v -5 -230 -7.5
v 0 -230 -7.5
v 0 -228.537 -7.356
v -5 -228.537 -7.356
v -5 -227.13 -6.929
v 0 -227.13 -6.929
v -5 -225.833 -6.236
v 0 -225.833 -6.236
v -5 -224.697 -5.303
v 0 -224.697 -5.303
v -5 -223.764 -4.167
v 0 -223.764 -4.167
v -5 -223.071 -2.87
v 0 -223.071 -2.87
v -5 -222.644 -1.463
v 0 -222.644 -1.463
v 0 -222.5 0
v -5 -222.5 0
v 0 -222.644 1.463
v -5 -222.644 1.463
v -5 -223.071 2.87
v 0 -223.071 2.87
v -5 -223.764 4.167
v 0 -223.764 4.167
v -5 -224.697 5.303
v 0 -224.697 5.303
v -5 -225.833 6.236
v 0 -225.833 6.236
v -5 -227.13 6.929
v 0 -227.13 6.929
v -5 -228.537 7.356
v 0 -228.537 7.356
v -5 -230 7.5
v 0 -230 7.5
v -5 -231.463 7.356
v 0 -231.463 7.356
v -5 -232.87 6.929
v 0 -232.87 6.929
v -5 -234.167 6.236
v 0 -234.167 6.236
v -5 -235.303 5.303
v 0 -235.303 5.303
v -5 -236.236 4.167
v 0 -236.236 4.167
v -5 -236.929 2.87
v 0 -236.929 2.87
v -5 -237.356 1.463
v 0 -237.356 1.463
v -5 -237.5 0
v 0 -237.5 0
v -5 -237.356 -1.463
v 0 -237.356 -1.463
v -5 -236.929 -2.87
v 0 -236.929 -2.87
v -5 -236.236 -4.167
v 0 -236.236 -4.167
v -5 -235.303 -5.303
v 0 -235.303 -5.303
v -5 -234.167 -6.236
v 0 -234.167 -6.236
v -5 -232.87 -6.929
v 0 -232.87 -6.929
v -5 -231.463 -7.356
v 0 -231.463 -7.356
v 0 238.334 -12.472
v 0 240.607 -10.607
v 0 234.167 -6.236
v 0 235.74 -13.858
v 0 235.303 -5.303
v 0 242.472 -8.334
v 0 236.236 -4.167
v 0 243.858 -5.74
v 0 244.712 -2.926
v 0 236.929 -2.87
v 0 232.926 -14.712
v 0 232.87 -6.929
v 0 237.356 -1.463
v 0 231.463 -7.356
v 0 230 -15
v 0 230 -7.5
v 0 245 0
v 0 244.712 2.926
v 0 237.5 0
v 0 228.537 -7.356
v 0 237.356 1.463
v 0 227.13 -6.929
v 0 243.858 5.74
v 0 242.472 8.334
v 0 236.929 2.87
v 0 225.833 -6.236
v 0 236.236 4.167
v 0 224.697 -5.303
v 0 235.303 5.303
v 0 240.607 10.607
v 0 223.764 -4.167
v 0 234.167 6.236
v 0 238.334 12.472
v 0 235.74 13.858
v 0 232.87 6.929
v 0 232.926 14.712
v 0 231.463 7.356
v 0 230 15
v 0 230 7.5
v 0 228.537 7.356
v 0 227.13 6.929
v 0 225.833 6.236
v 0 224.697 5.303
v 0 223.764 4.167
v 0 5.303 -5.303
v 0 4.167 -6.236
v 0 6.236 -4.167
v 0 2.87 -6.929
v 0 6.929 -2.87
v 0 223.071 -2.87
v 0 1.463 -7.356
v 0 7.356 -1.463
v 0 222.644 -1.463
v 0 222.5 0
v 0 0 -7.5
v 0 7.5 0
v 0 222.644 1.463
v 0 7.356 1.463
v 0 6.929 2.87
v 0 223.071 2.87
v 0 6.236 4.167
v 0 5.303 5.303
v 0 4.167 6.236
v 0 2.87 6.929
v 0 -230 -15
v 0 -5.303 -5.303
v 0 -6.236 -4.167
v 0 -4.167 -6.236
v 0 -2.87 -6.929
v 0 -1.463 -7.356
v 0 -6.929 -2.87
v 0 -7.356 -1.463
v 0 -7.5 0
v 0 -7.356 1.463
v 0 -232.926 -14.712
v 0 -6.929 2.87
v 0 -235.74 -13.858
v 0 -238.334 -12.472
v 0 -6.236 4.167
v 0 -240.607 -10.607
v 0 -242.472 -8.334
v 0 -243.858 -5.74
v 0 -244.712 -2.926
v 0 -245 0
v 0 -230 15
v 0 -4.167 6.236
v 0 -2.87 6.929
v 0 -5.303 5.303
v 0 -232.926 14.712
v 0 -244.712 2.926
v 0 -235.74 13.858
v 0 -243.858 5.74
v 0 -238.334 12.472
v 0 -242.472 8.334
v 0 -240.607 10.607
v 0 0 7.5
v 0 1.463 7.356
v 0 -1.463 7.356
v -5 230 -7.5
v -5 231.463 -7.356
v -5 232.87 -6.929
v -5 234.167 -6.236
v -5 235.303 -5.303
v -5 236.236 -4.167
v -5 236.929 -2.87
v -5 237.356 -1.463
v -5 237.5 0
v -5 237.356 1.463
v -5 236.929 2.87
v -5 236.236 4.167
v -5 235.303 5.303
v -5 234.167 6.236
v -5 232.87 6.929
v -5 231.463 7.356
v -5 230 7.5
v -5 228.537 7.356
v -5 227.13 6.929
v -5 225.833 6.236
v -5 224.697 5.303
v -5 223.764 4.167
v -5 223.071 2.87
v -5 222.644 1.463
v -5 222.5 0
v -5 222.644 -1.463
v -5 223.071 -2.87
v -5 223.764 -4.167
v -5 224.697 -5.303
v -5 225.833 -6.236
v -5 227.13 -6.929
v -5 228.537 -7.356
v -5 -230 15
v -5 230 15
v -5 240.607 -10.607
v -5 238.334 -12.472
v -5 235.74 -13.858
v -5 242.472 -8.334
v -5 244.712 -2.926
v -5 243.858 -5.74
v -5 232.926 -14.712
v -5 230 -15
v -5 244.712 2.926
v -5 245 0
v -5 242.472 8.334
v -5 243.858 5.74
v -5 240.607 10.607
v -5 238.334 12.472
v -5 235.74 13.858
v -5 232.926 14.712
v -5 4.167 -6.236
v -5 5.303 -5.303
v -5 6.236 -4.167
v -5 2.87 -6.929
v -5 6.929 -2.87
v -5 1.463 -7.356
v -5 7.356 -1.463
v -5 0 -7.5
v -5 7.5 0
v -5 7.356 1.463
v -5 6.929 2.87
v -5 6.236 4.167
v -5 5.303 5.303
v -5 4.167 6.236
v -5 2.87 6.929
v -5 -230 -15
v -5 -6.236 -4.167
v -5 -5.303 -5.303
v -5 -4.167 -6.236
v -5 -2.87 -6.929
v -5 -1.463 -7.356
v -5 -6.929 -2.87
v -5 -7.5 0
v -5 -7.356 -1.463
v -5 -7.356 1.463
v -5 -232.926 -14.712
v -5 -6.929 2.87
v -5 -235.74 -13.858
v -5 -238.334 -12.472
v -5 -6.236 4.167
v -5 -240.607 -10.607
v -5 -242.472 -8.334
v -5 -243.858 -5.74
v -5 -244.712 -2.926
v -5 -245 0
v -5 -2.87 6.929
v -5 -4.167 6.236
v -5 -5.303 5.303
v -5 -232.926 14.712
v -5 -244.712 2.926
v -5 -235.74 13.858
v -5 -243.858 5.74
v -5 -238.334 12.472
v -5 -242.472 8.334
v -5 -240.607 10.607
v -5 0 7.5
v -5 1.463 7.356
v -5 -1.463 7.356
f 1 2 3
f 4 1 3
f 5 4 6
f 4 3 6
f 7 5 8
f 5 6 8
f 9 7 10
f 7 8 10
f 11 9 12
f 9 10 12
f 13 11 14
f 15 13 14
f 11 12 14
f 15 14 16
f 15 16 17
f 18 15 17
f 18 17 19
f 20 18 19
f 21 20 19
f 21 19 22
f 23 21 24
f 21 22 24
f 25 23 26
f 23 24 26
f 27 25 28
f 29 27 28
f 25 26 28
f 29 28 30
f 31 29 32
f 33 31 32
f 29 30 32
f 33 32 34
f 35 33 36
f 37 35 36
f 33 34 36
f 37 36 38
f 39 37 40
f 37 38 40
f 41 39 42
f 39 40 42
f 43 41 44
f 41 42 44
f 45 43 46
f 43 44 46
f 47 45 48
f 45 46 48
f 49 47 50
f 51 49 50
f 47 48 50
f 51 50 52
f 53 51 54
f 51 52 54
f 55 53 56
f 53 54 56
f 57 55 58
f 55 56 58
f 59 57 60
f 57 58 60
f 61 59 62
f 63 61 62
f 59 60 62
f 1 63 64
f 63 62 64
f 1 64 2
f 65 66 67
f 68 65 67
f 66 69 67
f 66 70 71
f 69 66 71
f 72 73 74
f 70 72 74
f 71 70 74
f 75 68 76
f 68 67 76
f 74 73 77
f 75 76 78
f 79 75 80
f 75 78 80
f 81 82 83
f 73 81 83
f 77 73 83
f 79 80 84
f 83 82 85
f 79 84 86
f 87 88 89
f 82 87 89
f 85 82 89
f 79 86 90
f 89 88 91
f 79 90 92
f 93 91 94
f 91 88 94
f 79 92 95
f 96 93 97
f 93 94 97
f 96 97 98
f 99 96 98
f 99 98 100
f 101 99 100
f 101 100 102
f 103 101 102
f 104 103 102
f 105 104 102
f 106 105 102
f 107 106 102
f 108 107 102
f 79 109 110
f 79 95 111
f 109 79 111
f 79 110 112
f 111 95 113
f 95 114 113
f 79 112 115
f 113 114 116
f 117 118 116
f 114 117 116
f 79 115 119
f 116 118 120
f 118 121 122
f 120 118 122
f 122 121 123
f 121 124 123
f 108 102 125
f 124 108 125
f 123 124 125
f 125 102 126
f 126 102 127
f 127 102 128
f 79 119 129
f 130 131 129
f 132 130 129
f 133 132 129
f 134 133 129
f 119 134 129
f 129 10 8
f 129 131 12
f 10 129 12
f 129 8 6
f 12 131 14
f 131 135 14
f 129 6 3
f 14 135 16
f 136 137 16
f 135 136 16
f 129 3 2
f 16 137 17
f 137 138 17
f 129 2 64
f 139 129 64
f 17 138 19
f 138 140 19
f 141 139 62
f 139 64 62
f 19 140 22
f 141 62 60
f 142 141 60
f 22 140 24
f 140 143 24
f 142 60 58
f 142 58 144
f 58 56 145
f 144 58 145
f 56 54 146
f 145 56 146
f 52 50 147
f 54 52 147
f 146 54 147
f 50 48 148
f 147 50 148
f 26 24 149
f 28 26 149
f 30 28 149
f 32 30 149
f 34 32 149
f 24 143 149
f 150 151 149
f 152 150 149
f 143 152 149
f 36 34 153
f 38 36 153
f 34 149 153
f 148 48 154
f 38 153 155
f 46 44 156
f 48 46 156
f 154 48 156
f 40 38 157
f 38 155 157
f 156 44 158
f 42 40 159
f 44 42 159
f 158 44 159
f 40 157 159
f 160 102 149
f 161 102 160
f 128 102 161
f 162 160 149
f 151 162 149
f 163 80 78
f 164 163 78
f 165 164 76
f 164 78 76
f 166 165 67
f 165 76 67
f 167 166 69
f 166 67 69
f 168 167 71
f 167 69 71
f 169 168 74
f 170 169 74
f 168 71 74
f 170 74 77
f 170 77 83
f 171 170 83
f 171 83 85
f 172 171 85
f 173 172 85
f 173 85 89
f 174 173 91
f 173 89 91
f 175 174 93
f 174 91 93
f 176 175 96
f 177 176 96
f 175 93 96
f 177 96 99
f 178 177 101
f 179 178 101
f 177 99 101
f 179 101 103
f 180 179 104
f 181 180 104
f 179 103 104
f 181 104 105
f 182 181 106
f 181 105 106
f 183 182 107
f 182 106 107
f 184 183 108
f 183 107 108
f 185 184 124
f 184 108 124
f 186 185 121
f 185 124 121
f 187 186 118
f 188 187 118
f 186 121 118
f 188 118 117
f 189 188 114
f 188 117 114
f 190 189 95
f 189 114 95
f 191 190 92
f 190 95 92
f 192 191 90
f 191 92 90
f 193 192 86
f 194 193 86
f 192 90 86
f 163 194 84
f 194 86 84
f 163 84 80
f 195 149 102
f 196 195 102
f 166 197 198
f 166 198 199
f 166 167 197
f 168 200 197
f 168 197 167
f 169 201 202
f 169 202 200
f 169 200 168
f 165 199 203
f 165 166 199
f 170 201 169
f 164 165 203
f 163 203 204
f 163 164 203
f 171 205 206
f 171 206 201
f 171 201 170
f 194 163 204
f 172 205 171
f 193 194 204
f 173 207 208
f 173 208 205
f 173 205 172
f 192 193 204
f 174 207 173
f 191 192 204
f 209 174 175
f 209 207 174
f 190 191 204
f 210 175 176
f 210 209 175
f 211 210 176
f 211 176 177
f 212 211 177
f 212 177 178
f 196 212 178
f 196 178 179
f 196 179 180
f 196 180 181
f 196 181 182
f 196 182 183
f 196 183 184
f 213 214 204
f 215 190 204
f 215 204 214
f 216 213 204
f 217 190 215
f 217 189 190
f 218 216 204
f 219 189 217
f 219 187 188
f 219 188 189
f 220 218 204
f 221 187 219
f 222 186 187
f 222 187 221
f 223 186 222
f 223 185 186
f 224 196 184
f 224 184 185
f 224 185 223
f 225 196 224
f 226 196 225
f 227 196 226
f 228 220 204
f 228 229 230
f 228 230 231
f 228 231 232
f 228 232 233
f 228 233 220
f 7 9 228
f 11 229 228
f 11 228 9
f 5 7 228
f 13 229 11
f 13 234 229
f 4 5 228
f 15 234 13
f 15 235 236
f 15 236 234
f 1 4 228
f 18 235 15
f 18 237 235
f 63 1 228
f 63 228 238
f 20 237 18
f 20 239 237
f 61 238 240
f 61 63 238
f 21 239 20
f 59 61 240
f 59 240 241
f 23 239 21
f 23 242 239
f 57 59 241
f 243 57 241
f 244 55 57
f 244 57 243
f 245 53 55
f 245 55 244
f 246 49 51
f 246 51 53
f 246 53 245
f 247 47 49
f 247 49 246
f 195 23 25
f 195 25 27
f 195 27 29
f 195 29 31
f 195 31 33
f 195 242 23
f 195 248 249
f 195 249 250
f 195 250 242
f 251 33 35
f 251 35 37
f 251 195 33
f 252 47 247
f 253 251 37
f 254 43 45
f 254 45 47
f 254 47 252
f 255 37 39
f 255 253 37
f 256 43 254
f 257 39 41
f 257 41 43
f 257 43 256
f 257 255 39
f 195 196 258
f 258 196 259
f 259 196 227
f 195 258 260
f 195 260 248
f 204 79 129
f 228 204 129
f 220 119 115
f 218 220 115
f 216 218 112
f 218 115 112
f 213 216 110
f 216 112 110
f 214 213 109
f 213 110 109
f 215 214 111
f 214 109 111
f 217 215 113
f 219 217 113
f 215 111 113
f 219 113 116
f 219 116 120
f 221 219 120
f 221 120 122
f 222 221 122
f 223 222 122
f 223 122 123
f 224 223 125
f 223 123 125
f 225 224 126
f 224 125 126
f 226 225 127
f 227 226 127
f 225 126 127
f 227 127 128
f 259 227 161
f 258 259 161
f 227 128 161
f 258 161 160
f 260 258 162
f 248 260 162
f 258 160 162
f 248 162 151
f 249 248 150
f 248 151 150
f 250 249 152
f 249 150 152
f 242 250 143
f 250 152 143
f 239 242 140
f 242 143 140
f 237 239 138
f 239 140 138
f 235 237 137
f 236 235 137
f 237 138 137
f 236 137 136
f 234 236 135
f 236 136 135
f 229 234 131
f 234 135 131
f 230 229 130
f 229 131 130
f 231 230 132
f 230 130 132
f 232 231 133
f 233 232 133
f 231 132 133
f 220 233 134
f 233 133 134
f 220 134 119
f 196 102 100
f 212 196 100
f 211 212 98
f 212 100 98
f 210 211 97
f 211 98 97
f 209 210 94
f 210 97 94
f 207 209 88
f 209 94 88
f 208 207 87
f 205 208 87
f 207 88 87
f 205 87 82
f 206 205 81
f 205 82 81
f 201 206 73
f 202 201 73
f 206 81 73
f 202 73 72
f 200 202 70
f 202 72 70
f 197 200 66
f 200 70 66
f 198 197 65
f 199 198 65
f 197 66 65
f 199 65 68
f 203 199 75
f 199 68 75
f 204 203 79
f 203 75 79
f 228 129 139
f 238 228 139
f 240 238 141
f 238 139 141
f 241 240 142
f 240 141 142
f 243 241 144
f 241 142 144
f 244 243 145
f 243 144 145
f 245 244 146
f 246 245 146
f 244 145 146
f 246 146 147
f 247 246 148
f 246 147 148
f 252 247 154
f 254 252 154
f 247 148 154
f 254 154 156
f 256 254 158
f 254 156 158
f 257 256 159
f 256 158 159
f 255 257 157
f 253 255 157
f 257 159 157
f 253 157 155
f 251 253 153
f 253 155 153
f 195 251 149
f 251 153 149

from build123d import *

# Parameters (mm, degrees)
SKETCH1_R           = 7.5
BOSS_EXTRUDE1_DEPTH = 5


with BuildPart() as part:
    # Sketch1 → Boss-Extrude1 (new body)
    with BuildSketch(Plane.YZ):
        with BuildLine():
            Line((-230, 15), (230, 15))
            ThreePointArc((230, 15), (245, 0), (230, -15))
            Line((230, -15), (-230, -15))
            ThreePointArc((-230, -15), (-245, 0), (-230, 15))
        make_face()
        with Locations(Location((-230, 0, 0), (0, 0, 270))):
            Circle(SKETCH1_R, mode=Mode.SUBTRACT)
        with Locations(Location((0, 0, 0), (0, 0, 270))):
            Circle(SKETCH1_R, mode=Mode.SUBTRACT)
        with Locations(Location((230, 0, 0), (0, 0, 270))):
            Circle(SKETCH1_R, mode=Mode.SUBTRACT)
    extrude(amount=-BOSS_EXTRUDE1_DEPTH)


solid = part.part
